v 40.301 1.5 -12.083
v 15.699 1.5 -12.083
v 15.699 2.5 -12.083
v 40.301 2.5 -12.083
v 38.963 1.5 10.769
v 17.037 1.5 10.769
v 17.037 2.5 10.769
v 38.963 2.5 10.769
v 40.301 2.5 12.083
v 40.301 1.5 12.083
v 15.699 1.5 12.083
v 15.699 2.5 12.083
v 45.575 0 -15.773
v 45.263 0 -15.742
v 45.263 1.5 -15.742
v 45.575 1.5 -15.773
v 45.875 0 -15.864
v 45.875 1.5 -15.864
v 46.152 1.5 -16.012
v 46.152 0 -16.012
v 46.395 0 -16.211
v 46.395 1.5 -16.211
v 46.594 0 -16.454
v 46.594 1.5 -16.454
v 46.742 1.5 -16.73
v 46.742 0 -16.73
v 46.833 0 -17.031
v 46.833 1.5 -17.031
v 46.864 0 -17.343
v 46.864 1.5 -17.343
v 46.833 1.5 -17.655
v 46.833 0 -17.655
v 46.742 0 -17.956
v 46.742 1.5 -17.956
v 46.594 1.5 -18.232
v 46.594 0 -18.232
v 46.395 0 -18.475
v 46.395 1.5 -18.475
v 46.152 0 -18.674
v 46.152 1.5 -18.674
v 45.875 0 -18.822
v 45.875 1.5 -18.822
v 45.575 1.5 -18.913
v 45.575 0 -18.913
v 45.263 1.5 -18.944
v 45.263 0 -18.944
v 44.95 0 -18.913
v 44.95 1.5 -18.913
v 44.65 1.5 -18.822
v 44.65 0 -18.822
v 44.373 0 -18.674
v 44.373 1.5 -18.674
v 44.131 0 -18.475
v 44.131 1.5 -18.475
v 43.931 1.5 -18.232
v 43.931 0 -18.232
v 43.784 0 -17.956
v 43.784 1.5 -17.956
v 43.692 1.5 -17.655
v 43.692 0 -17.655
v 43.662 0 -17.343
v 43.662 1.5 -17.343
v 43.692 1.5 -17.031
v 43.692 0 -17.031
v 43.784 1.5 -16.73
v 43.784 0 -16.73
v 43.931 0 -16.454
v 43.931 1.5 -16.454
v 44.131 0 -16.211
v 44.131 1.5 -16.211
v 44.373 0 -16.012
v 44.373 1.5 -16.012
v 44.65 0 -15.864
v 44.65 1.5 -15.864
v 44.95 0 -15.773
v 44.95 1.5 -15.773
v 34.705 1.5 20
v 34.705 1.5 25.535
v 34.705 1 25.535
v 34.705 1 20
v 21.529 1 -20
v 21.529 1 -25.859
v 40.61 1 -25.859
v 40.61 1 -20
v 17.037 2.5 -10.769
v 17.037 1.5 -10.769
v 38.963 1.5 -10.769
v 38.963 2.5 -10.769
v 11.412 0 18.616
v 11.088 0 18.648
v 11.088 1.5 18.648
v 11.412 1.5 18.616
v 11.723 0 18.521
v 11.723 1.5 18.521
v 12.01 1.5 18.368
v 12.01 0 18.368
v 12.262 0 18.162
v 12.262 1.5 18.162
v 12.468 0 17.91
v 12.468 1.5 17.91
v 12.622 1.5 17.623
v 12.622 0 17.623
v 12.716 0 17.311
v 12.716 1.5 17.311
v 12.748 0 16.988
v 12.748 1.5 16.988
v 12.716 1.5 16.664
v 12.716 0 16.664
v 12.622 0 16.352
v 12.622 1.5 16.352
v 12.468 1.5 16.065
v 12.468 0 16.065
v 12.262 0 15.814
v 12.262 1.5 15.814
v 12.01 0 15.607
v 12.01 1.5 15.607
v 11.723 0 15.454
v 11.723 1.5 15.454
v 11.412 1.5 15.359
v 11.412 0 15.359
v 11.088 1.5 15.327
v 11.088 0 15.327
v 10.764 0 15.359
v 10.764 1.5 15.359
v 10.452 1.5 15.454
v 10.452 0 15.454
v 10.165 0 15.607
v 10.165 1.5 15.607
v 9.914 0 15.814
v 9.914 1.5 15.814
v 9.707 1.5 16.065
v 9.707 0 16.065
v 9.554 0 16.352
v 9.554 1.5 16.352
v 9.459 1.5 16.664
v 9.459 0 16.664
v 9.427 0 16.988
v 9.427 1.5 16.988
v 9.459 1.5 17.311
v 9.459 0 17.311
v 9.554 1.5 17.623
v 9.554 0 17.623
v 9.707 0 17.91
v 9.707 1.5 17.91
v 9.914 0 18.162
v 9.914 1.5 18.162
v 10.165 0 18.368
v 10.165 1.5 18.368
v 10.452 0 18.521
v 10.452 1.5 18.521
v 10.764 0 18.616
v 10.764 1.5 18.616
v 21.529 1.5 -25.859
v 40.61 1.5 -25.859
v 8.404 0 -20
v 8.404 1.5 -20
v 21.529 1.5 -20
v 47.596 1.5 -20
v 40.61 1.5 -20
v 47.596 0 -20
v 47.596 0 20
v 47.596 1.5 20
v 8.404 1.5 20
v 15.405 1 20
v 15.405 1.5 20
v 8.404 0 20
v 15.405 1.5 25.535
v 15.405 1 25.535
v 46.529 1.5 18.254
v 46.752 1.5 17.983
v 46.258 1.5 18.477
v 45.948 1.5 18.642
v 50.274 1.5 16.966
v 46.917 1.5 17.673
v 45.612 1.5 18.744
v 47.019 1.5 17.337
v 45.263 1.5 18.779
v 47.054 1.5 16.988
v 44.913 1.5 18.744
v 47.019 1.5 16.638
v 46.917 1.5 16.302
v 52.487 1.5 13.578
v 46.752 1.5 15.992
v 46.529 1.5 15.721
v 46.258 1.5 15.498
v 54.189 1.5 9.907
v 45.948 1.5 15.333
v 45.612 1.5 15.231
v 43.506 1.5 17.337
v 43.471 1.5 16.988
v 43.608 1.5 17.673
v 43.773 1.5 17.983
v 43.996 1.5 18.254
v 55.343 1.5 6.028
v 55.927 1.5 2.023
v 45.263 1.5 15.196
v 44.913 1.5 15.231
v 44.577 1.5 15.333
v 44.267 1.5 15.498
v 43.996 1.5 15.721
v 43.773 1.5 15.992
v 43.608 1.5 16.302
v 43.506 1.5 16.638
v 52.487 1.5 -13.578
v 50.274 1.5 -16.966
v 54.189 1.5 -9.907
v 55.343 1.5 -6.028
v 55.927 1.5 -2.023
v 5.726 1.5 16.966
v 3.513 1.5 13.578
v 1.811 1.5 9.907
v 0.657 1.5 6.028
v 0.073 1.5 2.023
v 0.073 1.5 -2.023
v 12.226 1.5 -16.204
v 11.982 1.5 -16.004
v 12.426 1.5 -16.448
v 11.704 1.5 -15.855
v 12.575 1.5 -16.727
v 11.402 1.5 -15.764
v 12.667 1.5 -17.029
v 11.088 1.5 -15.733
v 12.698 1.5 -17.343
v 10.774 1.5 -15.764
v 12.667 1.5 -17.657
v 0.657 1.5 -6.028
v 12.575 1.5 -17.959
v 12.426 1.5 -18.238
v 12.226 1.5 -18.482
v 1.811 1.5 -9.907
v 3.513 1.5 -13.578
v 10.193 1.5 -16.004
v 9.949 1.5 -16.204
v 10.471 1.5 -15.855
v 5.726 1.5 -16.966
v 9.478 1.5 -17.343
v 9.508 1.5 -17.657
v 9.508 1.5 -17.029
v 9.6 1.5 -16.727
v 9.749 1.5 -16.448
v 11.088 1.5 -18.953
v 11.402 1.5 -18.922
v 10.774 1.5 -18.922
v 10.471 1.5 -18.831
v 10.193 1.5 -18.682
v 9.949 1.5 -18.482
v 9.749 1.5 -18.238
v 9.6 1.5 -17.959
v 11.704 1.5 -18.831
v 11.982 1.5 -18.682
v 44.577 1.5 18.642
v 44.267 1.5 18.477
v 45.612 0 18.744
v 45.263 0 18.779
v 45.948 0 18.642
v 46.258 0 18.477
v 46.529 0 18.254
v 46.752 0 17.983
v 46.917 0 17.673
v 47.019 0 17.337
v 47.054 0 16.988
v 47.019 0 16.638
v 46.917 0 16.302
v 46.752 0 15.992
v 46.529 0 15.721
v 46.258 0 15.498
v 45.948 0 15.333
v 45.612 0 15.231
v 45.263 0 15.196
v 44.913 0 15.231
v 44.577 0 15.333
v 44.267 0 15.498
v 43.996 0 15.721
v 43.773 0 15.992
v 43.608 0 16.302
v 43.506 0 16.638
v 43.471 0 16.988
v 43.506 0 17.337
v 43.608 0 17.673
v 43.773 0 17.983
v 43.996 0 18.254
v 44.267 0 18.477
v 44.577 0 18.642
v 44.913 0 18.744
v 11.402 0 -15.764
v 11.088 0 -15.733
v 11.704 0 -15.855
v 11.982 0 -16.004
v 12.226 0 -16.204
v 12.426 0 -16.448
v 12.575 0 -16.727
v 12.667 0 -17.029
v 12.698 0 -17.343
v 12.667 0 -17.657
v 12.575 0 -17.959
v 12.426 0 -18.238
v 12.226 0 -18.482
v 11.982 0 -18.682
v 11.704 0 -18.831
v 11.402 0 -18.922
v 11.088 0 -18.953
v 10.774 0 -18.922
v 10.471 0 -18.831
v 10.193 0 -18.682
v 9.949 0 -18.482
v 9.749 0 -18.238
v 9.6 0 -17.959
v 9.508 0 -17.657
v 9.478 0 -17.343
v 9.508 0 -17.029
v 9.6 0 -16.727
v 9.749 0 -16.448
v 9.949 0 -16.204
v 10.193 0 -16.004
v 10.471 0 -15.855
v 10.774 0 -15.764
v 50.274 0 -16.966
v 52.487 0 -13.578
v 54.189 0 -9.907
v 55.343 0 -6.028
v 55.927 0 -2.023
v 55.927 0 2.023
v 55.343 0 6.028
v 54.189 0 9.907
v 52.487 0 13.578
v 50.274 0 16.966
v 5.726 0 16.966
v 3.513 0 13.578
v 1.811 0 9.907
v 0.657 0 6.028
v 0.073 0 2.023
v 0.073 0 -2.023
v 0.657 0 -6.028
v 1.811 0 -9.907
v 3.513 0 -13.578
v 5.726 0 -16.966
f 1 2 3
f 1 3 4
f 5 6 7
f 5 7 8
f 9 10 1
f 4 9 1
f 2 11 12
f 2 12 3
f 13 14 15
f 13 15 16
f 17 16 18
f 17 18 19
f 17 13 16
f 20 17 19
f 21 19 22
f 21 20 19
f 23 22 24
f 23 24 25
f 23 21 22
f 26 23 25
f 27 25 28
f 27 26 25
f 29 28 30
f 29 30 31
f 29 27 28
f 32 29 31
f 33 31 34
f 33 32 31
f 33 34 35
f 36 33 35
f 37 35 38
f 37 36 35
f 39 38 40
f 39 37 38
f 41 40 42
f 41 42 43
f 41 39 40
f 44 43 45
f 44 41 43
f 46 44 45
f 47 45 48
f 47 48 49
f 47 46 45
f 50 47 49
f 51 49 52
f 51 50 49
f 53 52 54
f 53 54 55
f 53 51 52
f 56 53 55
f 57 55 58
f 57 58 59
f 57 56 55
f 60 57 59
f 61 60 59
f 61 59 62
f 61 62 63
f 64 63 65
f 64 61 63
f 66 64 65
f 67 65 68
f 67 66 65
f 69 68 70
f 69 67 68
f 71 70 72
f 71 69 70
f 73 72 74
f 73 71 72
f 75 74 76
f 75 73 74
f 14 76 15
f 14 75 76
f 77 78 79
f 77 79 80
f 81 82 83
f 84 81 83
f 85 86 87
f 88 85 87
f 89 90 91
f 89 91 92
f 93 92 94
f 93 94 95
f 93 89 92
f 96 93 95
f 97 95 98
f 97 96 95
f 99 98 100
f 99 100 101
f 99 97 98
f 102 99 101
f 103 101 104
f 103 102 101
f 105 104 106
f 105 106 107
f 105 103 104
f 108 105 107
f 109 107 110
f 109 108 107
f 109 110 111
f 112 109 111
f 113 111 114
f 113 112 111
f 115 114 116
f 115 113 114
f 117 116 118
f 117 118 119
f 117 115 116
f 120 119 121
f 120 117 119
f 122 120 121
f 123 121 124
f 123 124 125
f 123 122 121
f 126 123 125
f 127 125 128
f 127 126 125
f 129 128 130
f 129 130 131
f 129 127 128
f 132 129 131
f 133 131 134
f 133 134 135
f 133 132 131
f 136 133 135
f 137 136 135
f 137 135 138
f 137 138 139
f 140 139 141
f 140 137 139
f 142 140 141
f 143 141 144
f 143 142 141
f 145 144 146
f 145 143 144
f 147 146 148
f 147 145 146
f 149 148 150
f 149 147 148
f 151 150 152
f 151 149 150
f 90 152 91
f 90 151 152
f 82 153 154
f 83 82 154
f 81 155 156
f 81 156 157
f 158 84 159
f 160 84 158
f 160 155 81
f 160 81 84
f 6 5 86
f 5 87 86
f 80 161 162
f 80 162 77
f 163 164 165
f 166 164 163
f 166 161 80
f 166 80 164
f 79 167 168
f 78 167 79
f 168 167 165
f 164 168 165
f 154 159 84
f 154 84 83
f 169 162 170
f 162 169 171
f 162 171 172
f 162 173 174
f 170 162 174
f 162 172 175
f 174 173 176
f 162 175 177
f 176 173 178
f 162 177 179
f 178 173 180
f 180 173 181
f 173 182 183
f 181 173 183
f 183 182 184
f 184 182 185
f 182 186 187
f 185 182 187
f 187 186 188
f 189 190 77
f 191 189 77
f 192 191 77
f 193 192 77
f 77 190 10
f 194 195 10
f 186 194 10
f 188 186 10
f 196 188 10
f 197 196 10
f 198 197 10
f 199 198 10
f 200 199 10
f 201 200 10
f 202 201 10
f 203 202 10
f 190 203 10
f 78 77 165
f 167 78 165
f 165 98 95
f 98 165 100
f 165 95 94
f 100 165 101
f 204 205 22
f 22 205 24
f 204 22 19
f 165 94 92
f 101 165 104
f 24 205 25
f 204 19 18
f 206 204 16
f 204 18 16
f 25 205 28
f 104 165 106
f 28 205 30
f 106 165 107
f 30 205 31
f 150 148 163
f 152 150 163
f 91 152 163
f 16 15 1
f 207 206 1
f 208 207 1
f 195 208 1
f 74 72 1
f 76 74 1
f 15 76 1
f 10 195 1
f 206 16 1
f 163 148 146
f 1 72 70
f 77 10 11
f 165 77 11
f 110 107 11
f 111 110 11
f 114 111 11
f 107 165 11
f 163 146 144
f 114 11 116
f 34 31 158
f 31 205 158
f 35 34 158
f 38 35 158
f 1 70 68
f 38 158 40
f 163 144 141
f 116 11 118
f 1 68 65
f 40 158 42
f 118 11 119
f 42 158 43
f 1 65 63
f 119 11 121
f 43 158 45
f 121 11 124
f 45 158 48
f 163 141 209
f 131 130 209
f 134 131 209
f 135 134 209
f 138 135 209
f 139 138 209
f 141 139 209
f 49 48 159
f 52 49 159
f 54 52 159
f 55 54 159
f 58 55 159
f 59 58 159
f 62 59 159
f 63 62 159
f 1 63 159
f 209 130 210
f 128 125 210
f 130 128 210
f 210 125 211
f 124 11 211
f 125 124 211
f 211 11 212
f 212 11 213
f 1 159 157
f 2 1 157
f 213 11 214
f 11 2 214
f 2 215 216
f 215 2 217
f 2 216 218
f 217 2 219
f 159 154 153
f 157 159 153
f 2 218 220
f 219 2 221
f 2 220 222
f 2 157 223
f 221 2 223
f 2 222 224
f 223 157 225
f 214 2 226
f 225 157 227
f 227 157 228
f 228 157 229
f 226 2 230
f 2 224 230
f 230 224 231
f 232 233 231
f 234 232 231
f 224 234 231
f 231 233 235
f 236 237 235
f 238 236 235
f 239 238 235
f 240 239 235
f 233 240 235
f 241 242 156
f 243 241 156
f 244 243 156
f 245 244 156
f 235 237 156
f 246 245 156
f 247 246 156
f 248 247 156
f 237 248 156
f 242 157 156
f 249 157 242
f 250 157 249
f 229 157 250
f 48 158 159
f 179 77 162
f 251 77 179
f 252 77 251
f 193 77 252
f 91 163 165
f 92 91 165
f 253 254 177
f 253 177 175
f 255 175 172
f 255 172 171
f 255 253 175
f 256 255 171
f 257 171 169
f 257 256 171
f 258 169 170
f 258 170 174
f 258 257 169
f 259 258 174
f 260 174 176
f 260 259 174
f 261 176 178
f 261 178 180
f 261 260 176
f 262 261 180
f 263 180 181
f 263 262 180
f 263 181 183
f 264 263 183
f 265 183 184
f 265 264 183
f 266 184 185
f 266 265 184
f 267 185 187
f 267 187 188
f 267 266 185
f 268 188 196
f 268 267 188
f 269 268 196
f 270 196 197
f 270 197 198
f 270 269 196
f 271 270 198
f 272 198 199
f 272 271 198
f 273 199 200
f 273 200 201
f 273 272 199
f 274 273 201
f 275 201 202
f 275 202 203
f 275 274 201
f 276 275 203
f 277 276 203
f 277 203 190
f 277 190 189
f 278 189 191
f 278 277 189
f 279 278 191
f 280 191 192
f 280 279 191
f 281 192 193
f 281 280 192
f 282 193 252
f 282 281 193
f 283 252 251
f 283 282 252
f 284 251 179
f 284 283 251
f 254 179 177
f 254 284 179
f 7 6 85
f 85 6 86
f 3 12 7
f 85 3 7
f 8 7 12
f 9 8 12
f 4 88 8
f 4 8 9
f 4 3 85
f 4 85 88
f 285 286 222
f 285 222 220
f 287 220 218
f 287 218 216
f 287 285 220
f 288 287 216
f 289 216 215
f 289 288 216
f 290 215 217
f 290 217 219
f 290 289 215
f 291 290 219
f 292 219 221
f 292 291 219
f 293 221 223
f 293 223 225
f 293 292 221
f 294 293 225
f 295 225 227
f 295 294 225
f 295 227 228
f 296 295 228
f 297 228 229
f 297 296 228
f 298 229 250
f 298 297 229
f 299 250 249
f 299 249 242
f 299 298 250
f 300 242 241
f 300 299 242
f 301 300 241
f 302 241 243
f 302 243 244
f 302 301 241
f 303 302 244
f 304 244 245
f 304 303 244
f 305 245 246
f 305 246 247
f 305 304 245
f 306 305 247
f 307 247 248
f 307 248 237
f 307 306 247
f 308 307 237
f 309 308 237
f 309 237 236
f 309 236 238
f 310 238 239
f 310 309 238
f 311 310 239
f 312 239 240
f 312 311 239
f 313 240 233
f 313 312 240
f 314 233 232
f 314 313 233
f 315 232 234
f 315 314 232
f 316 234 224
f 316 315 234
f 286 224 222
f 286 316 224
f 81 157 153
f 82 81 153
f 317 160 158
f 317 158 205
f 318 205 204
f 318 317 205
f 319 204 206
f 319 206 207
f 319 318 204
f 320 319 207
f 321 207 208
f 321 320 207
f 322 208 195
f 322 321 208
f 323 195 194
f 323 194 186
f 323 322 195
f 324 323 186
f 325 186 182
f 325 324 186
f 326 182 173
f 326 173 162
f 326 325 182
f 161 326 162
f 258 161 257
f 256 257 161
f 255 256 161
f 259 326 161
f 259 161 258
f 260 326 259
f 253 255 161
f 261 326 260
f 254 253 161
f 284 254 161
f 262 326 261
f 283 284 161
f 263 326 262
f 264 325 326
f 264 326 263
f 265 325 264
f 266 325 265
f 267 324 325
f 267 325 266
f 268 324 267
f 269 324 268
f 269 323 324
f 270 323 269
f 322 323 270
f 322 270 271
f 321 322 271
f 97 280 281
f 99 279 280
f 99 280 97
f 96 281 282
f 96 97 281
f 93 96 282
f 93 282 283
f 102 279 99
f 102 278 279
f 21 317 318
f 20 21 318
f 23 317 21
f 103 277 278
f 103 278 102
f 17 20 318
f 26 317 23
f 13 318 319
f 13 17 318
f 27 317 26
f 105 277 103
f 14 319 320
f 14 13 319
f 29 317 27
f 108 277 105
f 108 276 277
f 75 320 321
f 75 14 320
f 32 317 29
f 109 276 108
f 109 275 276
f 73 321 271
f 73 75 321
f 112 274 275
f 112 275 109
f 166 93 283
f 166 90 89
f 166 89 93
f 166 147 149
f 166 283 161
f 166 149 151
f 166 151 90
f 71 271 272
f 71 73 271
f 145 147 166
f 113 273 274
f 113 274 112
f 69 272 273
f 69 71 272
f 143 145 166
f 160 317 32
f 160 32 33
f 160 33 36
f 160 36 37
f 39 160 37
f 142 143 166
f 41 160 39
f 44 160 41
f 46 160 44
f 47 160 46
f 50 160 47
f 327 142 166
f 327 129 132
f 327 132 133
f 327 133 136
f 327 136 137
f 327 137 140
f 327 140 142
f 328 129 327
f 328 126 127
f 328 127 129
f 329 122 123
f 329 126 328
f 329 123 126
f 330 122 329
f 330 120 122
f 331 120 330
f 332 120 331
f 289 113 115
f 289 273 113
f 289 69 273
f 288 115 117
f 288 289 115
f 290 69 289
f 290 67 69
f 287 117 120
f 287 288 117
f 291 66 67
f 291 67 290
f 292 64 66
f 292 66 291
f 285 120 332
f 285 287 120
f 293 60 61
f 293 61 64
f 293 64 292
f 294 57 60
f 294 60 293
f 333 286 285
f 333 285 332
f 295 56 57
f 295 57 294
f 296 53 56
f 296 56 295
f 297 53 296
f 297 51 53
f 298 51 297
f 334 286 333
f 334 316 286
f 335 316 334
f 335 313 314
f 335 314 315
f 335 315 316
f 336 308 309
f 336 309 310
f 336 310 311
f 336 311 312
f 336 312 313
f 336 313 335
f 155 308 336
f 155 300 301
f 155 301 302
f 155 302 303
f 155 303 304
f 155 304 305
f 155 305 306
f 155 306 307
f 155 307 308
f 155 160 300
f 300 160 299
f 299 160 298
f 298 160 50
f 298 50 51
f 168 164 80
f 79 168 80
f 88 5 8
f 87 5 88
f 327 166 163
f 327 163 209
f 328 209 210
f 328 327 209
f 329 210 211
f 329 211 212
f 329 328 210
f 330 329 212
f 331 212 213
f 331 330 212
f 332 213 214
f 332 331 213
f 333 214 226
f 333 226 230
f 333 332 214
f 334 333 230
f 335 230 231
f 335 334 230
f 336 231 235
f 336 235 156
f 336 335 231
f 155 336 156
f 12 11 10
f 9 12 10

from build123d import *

# Parameters (mm, degrees)
SKETCH2_R           = 1.610129379
SKETCH2_R_2         = 1.66029091
SKETCH2_R_3         = 1.791193395
SKETCH2_R_4         = 1.600916599
BOSS_EXTRUDE1_DEPTH = 1.5
SKETCH3_W           = 19.081191899
SKETCH3_H           = 5.85855086
SKETCH3_W_2         = 19.299887508
SKETCH3_H_2         = 5.534917291
BOSS_EXTRUDE2_DEPTH = 0.5
SKETCH4_W           = 24.601924878
SKETCH4_H           = 24.16573396
SKETCH4_W_2         = 21.926940144
SKETCH4_H_2         = 21.538176574
BOSS_EXTRUDE3_DEPTH = 1


with BuildPart() as part:
    # Sketch2 → Boss-Extrude1 (new body)
    with BuildSketch(Plane(origin=(0, 0, 0), x_dir=(1, 0, 0), z_dir=(0, 1, 0))):
        with BuildLine():
            Line((8.404082058, 20), (47.595917942, 20))
            ThreePointArc((47.595917942, 20), (56, 0), (47.595917942, -20))
            Line((47.595917942, -20), (8.404082058, -20))
            ThreePointArc((8.404082058, -20), (0, 0), (8.404082058, 20))
        make_face()
        with Locations(Location((11.087651709, 17.343003221, 0), (0, 0, 270))):
            Circle(SKETCH2_R, mode=Mode.SUBTRACT)
        with Locations(Location((11.087651709, -16.98750612, 0), (0, 0, 270))):
            Circle(SKETCH2_R_2, mode=Mode.SUBTRACT)
        with Locations(Location((45.262584723, -16.98750612, 0), (0, 0, 270))):
            Circle(SKETCH2_R_3, mode=Mode.SUBTRACT)
        with Locations(Location((45.262584723, 17.343003221, 0), (0, 0, 270))):
            Circle(SKETCH2_R_4, mode=Mode.SUBTRACT)
    extrude(amount=BOSS_EXTRUDE1_DEPTH)

    # Sketch3 → Boss-Extrude2 (add)
    with BuildSketch(Plane(origin=(0, 1.5, 0), x_dir=(1, 0, 0), z_dir=(0, 1, 0))):
        with Locations((31.069199174, 22.92927543)):
            Rectangle(SKETCH3_W, SKETCH3_H)
        with Locations((25.055069922, -22.767458645)):
            Rectangle(SKETCH3_W_2, SKETCH3_H_2)
    extrude(amount=-BOSS_EXTRUDE2_DEPTH)

    # Sketch4 → Boss-Extrude3 (add)
    with BuildSketch(Plane(origin=(0, 1.5, 0), x_dir=(1, 0, 0), z_dir=(0, 1, 0))):
        with Locations((28, 0)):
            Rectangle(SKETCH4_W, SKETCH4_H)
        with Locations((28, 0)):
            Rectangle(SKETCH4_W_2, SKETCH4_H_2, mode=Mode.SUBTRACT)
    extrude(amount=BOSS_EXTRUDE3_DEPTH)


solid = part.part
